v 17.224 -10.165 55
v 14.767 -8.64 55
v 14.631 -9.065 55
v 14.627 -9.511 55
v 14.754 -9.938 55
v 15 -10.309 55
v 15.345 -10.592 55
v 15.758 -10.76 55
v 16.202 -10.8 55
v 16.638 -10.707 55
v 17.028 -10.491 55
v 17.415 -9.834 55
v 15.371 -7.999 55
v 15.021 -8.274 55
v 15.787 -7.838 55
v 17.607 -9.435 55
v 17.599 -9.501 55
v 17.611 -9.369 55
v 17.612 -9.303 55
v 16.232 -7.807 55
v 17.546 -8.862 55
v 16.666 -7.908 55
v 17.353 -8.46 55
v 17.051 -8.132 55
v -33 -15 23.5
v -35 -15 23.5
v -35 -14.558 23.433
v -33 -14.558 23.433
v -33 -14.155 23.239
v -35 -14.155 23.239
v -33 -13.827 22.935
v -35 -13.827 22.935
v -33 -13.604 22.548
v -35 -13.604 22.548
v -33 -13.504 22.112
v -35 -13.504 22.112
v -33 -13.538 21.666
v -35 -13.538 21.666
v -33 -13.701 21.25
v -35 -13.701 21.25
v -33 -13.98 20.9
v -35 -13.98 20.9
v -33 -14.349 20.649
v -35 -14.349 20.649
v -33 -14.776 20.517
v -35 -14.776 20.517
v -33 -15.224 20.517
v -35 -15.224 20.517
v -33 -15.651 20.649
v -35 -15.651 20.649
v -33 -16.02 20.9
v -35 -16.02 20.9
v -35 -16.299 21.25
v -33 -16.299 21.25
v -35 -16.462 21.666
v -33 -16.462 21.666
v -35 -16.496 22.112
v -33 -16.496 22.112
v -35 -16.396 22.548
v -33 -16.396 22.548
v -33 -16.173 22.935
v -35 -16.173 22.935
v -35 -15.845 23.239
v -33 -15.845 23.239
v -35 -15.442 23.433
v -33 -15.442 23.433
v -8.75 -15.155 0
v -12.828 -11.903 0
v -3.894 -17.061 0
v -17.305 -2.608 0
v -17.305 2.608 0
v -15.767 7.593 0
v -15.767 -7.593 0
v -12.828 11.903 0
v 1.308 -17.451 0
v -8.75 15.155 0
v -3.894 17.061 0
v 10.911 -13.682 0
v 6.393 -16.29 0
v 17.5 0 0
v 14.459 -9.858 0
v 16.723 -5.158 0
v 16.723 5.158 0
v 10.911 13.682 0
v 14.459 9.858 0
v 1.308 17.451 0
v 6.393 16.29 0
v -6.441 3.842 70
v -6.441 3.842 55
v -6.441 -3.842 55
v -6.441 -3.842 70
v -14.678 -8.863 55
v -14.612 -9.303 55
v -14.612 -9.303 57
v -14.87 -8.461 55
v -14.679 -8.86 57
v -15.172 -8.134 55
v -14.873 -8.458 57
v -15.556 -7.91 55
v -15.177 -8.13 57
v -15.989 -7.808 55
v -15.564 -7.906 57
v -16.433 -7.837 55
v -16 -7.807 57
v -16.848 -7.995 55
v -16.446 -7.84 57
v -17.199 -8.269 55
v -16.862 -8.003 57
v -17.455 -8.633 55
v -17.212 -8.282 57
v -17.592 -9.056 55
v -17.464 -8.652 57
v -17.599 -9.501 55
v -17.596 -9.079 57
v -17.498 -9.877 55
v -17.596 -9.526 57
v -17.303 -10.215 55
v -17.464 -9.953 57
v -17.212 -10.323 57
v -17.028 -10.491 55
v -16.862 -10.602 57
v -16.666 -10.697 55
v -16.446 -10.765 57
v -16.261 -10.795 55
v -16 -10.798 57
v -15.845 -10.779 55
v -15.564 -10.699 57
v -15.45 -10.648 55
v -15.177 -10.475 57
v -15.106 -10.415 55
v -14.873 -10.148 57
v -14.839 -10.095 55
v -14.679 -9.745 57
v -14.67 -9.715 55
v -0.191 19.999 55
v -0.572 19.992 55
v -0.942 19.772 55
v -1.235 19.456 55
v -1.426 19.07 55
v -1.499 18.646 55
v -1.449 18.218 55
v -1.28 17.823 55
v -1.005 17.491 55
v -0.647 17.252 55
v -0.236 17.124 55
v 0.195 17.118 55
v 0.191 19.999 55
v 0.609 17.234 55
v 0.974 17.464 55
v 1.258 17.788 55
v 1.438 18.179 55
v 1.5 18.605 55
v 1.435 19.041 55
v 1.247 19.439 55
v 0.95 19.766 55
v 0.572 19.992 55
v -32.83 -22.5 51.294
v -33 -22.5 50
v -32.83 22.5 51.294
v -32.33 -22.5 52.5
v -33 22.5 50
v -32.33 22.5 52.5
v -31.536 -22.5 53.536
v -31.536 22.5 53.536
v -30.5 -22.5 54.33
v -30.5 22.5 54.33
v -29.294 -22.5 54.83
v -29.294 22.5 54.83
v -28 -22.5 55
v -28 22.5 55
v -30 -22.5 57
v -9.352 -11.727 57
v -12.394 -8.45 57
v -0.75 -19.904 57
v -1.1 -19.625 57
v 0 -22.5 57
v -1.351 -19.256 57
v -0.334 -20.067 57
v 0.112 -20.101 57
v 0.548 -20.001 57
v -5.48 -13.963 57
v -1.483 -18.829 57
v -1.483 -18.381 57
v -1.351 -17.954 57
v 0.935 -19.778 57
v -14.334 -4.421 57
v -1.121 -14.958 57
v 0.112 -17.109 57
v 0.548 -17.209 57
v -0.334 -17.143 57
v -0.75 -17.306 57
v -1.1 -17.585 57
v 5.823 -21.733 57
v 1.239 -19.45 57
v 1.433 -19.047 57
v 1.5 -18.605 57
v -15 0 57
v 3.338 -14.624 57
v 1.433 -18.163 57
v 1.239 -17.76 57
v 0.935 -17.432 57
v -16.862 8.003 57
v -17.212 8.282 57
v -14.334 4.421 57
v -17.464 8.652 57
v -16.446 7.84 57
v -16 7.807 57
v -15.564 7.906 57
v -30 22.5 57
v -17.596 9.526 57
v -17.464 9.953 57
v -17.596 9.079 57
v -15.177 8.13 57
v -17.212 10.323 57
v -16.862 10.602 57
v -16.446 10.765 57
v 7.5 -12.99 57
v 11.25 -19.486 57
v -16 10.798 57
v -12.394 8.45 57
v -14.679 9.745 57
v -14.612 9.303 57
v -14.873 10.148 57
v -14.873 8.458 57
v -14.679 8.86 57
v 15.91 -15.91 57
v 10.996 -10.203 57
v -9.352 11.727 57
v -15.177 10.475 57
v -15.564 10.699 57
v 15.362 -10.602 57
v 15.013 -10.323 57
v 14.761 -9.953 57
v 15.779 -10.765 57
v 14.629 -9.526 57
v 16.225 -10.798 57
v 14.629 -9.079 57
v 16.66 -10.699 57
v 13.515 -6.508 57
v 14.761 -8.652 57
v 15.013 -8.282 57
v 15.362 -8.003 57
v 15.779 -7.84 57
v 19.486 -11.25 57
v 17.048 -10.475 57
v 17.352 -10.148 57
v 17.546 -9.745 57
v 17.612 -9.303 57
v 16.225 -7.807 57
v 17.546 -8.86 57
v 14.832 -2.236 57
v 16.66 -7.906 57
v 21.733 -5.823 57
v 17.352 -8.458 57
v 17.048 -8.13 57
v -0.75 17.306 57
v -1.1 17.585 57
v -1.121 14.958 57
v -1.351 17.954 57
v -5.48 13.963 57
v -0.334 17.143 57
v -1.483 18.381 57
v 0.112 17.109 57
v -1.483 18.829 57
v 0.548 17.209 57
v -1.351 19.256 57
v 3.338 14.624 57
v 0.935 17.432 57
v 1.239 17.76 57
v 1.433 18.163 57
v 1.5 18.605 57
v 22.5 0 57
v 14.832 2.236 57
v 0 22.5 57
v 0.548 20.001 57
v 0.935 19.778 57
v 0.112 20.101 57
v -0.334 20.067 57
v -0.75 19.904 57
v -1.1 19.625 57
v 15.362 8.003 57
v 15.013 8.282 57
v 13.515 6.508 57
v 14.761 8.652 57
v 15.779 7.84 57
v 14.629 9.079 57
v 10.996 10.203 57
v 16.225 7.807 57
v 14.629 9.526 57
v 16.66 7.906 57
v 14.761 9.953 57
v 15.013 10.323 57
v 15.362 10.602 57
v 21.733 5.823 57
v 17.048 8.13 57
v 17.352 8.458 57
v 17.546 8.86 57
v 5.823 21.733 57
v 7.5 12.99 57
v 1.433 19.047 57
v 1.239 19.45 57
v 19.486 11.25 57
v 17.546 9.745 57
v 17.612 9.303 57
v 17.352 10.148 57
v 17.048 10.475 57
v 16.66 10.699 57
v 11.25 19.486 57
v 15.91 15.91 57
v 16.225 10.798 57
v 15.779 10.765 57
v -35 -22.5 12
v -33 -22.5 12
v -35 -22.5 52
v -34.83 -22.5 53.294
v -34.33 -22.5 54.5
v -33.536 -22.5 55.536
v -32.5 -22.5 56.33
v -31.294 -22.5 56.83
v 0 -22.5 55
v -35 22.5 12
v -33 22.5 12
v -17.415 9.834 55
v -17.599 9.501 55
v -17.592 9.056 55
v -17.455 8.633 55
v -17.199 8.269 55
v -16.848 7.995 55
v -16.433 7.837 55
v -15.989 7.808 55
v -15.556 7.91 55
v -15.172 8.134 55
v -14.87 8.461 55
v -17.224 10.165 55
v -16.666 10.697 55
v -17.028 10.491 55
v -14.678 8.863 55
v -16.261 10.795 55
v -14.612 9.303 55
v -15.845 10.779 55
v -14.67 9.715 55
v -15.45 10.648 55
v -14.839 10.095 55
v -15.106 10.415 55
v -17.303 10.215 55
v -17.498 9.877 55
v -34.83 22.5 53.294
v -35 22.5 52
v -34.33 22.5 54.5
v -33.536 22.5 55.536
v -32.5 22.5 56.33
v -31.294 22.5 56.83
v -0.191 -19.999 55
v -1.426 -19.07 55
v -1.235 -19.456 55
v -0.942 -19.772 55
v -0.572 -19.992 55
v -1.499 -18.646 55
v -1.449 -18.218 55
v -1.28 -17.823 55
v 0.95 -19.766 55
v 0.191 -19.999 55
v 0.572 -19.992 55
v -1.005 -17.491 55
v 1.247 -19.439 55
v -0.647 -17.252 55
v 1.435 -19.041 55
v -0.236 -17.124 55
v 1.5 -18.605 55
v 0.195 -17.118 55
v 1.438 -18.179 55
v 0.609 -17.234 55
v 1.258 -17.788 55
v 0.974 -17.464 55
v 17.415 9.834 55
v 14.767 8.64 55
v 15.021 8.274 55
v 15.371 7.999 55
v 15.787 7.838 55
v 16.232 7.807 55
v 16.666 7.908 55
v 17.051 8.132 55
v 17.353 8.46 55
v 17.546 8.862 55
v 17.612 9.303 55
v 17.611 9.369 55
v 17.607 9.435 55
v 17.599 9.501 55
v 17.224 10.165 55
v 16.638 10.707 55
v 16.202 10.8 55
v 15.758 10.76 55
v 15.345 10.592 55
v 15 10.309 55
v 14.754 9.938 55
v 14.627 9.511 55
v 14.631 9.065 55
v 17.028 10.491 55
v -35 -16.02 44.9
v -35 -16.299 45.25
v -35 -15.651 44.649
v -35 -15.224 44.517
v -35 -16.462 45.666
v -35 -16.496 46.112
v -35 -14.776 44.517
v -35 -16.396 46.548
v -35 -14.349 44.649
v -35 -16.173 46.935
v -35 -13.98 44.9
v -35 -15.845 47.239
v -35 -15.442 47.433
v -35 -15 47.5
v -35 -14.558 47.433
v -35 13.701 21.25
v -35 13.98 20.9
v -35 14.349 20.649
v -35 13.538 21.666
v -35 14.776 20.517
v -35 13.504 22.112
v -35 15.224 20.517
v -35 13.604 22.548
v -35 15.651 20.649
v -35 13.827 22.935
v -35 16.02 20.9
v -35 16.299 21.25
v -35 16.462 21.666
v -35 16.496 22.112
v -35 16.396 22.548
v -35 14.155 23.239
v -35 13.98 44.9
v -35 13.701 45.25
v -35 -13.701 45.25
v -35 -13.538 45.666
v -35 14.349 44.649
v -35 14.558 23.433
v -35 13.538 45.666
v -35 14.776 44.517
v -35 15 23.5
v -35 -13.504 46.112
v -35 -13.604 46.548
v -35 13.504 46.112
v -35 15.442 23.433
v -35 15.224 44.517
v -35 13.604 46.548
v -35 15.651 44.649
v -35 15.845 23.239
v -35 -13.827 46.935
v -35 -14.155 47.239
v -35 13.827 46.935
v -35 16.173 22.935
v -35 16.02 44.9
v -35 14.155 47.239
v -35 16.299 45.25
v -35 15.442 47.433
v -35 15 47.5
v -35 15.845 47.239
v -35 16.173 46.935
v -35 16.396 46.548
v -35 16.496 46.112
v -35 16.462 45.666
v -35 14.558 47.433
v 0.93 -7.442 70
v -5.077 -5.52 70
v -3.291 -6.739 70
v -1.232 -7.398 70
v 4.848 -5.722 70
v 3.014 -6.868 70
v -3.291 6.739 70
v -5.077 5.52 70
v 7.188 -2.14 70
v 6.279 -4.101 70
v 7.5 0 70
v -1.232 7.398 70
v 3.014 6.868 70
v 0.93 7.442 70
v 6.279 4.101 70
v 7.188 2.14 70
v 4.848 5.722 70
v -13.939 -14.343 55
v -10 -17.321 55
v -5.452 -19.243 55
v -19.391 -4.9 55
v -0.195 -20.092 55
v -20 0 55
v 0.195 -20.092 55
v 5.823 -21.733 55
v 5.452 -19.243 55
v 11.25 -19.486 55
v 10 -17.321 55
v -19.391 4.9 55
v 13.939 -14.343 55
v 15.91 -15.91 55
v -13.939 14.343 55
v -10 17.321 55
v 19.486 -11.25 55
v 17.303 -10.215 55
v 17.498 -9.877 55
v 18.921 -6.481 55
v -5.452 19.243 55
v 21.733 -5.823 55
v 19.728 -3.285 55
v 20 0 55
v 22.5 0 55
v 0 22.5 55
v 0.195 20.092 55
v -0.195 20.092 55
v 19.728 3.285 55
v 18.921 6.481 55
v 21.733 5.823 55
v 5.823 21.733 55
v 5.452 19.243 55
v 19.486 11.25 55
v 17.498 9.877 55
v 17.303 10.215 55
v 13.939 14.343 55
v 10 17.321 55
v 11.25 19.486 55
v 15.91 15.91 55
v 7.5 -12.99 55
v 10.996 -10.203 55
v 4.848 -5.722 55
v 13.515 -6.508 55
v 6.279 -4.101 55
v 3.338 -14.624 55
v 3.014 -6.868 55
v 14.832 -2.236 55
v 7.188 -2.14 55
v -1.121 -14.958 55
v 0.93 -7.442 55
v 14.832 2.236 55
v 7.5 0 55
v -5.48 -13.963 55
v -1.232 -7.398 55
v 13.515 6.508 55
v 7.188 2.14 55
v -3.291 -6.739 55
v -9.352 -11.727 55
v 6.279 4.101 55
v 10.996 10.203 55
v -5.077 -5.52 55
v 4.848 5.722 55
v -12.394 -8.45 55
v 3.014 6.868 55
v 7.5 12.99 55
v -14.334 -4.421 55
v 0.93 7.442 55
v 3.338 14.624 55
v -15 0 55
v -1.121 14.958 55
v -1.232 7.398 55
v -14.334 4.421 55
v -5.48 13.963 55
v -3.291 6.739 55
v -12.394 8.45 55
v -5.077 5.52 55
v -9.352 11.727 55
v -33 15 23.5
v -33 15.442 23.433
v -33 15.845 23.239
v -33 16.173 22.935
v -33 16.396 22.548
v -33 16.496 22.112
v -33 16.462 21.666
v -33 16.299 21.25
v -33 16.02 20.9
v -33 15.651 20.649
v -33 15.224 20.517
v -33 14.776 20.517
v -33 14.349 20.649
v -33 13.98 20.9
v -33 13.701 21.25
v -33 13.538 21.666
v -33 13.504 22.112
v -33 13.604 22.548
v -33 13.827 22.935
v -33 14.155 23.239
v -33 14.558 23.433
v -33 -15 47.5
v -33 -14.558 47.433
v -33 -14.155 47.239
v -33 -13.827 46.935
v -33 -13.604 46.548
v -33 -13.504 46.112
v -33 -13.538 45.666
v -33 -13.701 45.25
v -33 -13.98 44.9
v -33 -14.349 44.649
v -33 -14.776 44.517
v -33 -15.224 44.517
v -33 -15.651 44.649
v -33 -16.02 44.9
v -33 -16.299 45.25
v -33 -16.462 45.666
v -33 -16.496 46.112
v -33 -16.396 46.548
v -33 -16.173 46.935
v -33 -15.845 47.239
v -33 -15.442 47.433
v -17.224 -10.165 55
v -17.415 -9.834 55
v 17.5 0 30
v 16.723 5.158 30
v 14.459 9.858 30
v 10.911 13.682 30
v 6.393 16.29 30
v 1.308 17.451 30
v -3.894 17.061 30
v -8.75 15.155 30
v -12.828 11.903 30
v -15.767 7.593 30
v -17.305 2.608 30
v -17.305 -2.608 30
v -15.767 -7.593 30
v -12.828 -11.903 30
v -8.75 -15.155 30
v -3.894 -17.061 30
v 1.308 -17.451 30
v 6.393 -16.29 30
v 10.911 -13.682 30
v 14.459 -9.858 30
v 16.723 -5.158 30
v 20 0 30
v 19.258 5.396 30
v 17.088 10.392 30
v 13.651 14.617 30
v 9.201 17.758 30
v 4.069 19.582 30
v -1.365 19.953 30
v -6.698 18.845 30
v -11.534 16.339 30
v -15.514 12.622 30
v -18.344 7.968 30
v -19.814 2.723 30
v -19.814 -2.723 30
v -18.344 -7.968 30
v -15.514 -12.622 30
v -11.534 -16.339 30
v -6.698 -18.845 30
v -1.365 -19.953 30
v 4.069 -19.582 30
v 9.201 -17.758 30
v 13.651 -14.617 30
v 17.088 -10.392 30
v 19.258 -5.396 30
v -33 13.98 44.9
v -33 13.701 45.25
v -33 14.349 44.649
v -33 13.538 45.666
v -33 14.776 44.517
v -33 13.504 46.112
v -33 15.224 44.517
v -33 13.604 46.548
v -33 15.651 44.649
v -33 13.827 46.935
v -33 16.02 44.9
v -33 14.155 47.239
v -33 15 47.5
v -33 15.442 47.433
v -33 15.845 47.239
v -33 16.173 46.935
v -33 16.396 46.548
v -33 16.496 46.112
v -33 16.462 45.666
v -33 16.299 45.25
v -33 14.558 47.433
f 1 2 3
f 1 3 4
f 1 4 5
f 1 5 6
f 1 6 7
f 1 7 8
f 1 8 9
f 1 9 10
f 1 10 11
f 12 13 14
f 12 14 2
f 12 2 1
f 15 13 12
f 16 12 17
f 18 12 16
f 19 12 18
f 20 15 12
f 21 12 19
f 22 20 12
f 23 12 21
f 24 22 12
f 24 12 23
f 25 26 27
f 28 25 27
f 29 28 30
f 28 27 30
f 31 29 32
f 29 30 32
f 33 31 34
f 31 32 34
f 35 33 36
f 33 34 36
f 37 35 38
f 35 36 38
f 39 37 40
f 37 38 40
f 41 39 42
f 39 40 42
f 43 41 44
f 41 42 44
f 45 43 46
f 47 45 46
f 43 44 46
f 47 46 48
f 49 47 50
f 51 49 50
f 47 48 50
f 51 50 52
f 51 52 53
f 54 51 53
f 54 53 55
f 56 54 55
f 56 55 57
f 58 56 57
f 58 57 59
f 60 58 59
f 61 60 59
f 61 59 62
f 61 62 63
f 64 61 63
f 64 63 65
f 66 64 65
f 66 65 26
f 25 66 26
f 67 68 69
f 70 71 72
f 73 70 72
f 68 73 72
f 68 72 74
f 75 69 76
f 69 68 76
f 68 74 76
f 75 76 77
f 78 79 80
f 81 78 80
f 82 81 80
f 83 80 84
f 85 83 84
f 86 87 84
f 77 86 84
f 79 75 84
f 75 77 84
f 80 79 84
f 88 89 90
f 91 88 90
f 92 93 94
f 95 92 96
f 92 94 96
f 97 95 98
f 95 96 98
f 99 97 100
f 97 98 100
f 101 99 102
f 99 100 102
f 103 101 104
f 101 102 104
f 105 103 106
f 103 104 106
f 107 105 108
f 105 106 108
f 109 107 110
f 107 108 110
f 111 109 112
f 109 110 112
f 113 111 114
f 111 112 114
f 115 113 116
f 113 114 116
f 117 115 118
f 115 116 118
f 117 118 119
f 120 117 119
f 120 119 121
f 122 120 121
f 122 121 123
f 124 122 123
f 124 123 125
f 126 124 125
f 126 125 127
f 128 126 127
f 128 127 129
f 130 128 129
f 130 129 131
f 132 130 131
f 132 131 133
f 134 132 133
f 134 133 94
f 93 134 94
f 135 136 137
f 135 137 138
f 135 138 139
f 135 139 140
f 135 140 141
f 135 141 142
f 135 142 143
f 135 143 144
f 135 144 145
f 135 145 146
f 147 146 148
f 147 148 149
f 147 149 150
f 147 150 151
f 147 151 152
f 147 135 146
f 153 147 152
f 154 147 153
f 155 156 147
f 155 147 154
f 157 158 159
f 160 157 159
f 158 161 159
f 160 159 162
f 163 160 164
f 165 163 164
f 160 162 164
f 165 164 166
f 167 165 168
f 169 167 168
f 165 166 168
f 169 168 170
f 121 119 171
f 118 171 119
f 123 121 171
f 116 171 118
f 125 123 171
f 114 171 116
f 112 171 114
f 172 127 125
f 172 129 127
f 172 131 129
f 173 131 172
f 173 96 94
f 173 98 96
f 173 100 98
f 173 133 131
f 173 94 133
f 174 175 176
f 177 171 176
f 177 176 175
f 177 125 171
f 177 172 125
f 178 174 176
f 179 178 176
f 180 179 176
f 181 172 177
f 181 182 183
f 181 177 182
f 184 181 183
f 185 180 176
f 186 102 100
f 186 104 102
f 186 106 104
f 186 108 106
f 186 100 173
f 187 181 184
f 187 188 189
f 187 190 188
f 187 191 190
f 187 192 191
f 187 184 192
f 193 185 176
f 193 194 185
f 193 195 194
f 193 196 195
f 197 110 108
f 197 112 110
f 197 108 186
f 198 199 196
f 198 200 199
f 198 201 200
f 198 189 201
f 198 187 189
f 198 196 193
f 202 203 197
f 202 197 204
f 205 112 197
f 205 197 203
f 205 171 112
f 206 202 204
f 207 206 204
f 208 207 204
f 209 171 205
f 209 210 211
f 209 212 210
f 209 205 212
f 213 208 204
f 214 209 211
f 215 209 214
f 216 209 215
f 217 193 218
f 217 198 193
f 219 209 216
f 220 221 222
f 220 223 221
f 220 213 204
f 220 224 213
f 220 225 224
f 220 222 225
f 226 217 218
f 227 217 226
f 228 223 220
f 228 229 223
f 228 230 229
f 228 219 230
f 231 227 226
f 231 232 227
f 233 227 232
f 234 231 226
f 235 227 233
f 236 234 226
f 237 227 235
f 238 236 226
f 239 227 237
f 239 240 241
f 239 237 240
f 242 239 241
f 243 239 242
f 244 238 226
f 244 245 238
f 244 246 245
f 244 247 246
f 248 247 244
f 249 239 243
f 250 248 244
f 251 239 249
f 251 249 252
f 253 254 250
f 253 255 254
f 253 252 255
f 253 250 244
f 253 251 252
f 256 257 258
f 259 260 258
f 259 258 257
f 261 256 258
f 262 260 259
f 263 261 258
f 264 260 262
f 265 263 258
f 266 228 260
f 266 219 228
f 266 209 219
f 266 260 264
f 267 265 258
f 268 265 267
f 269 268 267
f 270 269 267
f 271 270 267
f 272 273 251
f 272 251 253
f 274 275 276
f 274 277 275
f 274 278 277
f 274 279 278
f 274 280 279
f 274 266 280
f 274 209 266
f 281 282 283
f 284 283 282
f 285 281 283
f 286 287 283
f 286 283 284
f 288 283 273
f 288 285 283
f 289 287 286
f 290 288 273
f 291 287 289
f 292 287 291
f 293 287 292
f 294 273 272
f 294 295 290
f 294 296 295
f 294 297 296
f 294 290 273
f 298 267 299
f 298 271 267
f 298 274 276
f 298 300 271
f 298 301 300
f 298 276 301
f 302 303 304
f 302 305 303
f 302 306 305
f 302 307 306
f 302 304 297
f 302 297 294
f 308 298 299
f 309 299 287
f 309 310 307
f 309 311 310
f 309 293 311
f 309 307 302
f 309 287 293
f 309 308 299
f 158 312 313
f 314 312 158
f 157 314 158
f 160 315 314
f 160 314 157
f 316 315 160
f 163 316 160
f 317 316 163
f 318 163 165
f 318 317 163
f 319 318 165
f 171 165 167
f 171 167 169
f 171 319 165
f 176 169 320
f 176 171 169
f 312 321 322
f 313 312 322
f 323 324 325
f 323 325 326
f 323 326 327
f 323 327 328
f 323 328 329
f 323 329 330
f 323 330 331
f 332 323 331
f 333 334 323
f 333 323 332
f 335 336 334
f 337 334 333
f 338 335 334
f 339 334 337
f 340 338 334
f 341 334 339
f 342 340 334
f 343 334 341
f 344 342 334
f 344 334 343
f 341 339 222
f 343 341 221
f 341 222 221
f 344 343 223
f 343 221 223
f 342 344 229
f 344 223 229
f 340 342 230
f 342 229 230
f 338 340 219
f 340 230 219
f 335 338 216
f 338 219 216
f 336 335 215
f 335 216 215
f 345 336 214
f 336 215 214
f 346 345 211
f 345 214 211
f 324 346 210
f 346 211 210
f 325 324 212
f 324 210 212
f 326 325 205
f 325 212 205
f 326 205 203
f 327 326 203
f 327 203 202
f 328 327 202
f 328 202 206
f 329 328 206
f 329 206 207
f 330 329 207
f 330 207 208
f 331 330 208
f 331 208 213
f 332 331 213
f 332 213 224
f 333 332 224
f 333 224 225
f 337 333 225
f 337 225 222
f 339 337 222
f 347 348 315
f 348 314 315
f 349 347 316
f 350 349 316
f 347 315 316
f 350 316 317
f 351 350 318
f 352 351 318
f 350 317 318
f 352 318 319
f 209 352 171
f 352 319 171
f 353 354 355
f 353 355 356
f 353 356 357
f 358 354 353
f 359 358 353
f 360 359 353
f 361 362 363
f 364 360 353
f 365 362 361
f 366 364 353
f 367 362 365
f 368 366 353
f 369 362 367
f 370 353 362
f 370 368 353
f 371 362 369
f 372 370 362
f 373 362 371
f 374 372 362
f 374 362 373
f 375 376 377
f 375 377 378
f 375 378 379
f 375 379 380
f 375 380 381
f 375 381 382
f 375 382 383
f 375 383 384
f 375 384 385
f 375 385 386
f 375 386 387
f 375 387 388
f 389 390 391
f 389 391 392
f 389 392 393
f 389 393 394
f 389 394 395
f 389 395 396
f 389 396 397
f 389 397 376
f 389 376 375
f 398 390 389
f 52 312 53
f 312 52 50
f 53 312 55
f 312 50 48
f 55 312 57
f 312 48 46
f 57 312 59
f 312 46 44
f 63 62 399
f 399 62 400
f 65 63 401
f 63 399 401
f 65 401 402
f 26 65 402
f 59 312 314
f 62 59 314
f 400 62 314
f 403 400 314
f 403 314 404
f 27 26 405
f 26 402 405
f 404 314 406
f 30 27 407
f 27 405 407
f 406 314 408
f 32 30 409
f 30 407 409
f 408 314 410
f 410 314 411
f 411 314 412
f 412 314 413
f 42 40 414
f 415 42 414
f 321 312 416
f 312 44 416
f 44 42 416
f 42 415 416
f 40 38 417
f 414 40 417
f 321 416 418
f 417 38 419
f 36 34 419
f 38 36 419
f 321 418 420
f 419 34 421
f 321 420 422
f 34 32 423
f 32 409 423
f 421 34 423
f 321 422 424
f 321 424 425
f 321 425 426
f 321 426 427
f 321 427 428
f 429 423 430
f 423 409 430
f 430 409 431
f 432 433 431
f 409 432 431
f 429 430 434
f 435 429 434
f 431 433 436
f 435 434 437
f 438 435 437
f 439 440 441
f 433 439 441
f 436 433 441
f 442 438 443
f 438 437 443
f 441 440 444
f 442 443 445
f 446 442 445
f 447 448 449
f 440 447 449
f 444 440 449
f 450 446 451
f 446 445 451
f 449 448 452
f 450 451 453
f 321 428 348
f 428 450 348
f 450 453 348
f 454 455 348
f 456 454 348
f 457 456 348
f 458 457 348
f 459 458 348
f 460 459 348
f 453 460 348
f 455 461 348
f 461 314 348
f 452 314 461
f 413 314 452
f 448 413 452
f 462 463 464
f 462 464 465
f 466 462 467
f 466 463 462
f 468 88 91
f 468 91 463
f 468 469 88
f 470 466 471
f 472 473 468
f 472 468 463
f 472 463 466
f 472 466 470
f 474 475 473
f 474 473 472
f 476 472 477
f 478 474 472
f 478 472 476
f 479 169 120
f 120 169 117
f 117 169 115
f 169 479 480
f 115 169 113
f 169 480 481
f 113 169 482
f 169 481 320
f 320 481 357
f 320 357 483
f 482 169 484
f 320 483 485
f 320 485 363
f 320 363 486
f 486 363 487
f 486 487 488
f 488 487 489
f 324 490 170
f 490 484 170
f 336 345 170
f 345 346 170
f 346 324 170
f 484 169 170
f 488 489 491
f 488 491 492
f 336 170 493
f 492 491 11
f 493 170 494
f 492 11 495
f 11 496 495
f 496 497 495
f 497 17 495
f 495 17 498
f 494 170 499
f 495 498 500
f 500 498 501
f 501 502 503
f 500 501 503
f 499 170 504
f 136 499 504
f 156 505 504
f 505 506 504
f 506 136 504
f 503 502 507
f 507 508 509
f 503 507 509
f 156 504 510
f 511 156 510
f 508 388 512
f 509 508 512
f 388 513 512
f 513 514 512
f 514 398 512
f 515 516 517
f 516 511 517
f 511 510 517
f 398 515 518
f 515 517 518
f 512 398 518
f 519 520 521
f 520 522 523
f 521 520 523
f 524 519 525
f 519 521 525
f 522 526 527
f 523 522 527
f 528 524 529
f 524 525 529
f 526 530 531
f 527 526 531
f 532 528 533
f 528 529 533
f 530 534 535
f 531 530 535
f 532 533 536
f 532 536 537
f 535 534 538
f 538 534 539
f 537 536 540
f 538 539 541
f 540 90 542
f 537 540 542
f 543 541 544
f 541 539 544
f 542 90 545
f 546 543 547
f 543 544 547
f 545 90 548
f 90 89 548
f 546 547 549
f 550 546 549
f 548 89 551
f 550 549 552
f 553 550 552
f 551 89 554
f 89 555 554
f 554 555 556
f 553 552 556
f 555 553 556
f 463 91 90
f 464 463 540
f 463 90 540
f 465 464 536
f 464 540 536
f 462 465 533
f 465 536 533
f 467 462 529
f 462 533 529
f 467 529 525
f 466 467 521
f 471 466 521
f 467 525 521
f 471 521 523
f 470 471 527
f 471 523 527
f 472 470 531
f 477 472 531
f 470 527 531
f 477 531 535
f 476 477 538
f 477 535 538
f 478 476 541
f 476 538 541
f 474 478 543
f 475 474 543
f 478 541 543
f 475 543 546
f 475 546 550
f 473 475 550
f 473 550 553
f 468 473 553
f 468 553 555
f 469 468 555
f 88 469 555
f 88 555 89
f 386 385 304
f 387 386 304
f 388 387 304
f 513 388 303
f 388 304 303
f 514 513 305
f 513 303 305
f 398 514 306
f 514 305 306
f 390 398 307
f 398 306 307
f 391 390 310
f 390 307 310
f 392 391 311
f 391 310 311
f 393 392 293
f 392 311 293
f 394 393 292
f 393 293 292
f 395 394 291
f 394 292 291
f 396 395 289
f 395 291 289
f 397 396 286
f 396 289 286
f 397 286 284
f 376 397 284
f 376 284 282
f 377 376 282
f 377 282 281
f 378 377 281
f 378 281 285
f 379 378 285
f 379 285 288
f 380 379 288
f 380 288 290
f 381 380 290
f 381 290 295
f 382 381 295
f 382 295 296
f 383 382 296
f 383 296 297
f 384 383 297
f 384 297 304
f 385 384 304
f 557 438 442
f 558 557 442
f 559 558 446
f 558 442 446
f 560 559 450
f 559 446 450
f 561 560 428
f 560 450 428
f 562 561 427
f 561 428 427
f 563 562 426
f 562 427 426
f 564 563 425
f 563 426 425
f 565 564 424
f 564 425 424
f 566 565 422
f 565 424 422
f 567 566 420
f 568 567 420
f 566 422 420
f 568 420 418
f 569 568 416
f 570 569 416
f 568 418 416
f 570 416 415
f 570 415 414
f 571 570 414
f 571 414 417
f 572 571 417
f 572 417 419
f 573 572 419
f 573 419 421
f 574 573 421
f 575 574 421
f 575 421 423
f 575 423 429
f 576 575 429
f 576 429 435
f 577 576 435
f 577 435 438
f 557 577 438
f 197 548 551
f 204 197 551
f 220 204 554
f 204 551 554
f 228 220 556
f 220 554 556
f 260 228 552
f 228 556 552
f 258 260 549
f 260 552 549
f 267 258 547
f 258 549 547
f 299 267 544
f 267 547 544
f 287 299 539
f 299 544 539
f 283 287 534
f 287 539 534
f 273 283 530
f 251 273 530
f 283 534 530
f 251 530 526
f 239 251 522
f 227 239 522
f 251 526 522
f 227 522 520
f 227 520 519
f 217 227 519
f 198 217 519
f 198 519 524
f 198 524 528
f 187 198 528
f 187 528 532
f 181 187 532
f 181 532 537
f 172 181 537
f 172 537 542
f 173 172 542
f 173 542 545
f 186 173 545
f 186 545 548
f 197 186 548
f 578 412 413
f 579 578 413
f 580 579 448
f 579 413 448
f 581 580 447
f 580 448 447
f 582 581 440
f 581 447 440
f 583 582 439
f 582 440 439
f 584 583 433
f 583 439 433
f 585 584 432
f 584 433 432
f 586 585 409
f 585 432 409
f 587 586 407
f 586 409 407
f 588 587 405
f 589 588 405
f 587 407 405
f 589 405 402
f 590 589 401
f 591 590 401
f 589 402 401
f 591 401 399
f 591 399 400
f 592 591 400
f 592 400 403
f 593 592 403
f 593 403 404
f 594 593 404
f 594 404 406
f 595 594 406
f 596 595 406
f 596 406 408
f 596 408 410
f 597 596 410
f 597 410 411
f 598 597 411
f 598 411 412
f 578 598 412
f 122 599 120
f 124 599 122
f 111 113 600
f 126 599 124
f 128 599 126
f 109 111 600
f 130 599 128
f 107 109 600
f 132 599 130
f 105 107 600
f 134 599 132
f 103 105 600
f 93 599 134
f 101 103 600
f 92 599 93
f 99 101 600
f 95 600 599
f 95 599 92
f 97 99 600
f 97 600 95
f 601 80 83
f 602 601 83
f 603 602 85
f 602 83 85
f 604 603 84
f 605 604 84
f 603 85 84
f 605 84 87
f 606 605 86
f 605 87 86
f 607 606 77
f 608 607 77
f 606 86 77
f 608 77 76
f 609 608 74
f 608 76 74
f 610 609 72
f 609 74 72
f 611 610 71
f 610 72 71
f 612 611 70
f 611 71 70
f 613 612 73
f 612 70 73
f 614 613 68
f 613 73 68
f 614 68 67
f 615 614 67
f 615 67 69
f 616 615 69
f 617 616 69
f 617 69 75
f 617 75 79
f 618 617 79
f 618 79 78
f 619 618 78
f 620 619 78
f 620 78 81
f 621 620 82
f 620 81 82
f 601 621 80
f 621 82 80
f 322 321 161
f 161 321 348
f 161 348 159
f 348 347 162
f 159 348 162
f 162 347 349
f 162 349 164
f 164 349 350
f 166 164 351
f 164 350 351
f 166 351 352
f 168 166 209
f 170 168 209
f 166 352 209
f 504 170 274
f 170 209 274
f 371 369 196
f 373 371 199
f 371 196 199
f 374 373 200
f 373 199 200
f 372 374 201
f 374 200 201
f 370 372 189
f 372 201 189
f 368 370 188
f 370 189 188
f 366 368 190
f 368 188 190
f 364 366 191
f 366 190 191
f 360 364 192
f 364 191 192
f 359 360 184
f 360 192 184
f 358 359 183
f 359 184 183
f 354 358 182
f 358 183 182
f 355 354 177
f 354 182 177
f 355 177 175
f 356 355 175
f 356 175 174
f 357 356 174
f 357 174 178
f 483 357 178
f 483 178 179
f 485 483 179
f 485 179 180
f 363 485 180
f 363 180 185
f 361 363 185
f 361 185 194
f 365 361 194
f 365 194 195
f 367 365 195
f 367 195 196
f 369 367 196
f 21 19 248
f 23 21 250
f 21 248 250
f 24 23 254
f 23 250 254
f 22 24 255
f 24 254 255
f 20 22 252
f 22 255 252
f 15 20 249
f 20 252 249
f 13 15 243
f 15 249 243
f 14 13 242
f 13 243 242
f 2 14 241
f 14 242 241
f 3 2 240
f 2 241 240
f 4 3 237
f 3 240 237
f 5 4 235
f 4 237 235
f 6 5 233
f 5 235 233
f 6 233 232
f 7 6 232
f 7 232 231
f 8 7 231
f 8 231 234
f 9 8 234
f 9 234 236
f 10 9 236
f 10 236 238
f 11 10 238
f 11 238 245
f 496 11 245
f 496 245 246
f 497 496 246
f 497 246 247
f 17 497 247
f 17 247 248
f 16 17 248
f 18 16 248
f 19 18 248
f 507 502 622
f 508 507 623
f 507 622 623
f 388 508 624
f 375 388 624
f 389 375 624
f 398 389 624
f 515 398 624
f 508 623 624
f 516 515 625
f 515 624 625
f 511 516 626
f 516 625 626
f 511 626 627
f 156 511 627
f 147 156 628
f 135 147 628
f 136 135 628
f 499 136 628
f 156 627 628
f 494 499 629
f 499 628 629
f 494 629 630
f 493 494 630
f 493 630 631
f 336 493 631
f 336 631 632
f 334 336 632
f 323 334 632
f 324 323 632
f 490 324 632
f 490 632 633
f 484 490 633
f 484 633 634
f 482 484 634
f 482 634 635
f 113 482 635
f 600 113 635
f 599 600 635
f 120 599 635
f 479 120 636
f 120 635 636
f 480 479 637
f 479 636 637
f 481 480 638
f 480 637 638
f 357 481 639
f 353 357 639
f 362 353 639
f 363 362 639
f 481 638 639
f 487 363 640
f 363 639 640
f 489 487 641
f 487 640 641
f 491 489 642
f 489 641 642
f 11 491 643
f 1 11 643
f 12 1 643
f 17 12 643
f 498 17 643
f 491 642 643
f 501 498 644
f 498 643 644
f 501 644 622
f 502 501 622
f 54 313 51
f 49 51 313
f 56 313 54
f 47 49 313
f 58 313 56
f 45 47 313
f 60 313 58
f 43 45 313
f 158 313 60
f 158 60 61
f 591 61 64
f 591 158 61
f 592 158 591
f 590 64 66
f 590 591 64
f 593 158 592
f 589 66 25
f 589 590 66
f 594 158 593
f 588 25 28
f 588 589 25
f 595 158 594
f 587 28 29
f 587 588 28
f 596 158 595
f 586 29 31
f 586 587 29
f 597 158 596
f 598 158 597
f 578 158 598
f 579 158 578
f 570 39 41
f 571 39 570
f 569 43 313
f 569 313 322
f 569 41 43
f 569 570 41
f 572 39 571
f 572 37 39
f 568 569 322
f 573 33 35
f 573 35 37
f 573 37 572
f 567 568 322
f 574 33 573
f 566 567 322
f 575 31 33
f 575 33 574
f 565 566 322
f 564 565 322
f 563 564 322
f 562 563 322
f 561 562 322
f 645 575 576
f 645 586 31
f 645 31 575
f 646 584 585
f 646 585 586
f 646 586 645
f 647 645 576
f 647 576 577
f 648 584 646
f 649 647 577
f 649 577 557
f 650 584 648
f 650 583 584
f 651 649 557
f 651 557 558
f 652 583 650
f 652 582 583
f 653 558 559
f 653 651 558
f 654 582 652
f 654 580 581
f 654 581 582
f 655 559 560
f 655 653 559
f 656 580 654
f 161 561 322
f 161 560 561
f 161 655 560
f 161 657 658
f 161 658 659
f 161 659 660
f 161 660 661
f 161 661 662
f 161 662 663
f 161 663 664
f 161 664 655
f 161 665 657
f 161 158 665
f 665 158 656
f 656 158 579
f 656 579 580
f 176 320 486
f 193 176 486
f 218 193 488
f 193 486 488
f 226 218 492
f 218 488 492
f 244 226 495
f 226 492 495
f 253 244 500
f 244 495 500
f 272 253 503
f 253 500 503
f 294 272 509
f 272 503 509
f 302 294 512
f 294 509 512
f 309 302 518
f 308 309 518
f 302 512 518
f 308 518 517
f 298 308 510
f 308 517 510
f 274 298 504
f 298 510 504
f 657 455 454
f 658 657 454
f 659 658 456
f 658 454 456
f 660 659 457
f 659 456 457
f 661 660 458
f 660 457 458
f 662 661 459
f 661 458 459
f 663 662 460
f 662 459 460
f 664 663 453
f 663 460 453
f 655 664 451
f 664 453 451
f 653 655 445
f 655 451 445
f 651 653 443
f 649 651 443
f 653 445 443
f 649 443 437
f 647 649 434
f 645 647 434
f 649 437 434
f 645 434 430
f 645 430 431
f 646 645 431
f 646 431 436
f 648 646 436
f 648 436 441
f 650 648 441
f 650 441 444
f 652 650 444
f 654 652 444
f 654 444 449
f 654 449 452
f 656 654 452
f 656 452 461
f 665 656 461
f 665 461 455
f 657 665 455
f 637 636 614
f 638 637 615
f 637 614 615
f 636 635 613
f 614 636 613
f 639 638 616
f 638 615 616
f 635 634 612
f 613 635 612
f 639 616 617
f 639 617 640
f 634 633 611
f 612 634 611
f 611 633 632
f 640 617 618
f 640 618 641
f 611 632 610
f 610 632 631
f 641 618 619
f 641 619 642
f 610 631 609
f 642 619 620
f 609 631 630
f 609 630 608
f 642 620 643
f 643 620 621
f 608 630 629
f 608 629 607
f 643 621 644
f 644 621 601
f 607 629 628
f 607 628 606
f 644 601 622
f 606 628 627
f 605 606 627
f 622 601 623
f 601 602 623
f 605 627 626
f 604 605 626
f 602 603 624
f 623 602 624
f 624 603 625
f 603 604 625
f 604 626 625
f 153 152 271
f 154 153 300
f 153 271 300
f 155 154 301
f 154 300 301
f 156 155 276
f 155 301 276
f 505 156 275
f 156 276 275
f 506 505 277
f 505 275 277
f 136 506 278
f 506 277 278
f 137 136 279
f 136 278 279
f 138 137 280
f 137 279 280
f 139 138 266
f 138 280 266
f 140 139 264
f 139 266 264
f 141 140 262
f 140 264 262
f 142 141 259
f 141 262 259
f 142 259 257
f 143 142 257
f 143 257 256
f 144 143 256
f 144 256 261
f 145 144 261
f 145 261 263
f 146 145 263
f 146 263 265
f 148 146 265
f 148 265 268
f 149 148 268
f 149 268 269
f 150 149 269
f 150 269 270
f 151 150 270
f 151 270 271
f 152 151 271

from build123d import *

# Parameters (mm, degrees)
SKETCH_1_R          = 17.5
EXTRUDE_1_DEPTH     = 30
SKETCH_2_R          = 20
EXTRUDE_2_DEPTH     = 25
EXTRUDE_5_DEPTH     = 2
SKETCH_7_W          = 2
SKETCH_7_H          = 45
EXTRUDE_6_DEPTH     = 45
FILLET_3_R          = 5
SKETCH_8_R          = 1.5
CUT_EXTRUDE_1_DEPTH = 5
SKETCH_9_R          = 15
CUT_EXTRUDE_2_DEPTH = 10
EXTRUDE_7_DEPTH     = 70
SKETCH_11_R         = 1.5
CUT_EXTRUDE_3_DEPTH = 2


with BuildPart() as part:
    # 草图1 → 凸台-拉伸1 (new body)
    with BuildSketch(Plane.XY):
        Circle(SKETCH_1_R)
    extrude(amount=EXTRUDE_1_DEPTH)

    # 草图2 → 凸台-拉伸2 (add)
    with BuildSketch(Plane.XY.offset(30)):
        Circle(SKETCH_2_R)
    extrude(amount=EXTRUDE_2_DEPTH)

    # 草图6 → 凸台-拉伸5 (add)
    with BuildSketch(Plane.XY.offset(55)):
        with BuildLine():
            Line((0, 22.5), (-35, 22.5))
            Line((-35, 22.5), (-35, -22.5))
            Line((-35, -22.5), (0, -22.5))
            ThreePointArc((0, -22.5), (22.5, 0), (0, 22.5))
        make_face()
    extrude(amount=EXTRUDE_5_DEPTH)

    # 草图7 → 凸台-拉伸6 (add)
    with BuildSketch(Plane.XY.offset(57)):
        with Locations((-34, 0)):
            Rectangle(SKETCH_7_W, SKETCH_7_H)
    extrude(amount=-EXTRUDE_6_DEPTH)

    # 圆角3
    fillet_3_edges = [part.edges().sort_by_distance(p)[0] for p in [
        (-35, 0, 57),
        (-33, 0, 55),
    ]]
    fillet(fillet_3_edges, radius=FILLET_3_R)

    # 草图8 → 切除-拉伸1 (cut)
    with BuildSketch(Plane.ZY.offset(35)):
        with Locations((22, 15)):
            Circle(SKETCH_8_R)
        with Locations((22, -15)):
            Circle(SKETCH_8_R)
        with Locations((46, 15)):
            Circle(SKETCH_8_R)
        with Locations((46, -15)):
            Circle(SKETCH_8_R)
    extrude(amount=-CUT_EXTRUDE_1_DEPTH, mode=Mode.SUBTRACT)

    # 草图9 → 切除-拉伸2 (cut)
    with BuildSketch(Plane(origin=(0, 0, 55), x_dir=(-1, 0, 0), z_dir=(0, 0, -1))):
        Circle(SKETCH_9_R)
    extrude(amount=-CUT_EXTRUDE_2_DEPTH, mode=Mode.SUBTRACT)

    # 草图10 → 凸台-拉伸7 (add)
    with BuildSketch(Plane(origin=(0, 0, 0), x_dir=(-1, 0, 0), z_dir=(0, 0, -1))):
        with BuildLine():
            Line((6.4409075, 3.842487551), (6.4409075, -3.842487551))
            ThreePointArc((6.4409075, -3.842487551), (-7.5, 0), (6.4409075, 3.842487551))
        make_face()
    extrude(amount=-EXTRUDE_7_DEPTH)

    # 草图11 → 切除-拉伸3 (cut)
    with BuildSketch(Plane.XY.offset(57)):
        with Locations((0, 18.605053308)):
            Circle(SKETCH_11_R)
        with Locations((16.112448804, 9.302526654)):
            Circle(SKETCH_11_R)
        with Locations((16.112448804, -9.302526654)):
            Circle(SKETCH_11_R)
        with Locations((0, -18.605053308)):
            Circle(SKETCH_11_R)
        with Locations((-16.112448804, -9.302526654)):
            Circle(SKETCH_11_R)
        with Locations((-16.112448804, 9.302526654)):
            Circle(SKETCH_11_R)
    extrude(amount=-CUT_EXTRUDE_3_DEPTH, mode=Mode.SUBTRACT)


solid = part.part
